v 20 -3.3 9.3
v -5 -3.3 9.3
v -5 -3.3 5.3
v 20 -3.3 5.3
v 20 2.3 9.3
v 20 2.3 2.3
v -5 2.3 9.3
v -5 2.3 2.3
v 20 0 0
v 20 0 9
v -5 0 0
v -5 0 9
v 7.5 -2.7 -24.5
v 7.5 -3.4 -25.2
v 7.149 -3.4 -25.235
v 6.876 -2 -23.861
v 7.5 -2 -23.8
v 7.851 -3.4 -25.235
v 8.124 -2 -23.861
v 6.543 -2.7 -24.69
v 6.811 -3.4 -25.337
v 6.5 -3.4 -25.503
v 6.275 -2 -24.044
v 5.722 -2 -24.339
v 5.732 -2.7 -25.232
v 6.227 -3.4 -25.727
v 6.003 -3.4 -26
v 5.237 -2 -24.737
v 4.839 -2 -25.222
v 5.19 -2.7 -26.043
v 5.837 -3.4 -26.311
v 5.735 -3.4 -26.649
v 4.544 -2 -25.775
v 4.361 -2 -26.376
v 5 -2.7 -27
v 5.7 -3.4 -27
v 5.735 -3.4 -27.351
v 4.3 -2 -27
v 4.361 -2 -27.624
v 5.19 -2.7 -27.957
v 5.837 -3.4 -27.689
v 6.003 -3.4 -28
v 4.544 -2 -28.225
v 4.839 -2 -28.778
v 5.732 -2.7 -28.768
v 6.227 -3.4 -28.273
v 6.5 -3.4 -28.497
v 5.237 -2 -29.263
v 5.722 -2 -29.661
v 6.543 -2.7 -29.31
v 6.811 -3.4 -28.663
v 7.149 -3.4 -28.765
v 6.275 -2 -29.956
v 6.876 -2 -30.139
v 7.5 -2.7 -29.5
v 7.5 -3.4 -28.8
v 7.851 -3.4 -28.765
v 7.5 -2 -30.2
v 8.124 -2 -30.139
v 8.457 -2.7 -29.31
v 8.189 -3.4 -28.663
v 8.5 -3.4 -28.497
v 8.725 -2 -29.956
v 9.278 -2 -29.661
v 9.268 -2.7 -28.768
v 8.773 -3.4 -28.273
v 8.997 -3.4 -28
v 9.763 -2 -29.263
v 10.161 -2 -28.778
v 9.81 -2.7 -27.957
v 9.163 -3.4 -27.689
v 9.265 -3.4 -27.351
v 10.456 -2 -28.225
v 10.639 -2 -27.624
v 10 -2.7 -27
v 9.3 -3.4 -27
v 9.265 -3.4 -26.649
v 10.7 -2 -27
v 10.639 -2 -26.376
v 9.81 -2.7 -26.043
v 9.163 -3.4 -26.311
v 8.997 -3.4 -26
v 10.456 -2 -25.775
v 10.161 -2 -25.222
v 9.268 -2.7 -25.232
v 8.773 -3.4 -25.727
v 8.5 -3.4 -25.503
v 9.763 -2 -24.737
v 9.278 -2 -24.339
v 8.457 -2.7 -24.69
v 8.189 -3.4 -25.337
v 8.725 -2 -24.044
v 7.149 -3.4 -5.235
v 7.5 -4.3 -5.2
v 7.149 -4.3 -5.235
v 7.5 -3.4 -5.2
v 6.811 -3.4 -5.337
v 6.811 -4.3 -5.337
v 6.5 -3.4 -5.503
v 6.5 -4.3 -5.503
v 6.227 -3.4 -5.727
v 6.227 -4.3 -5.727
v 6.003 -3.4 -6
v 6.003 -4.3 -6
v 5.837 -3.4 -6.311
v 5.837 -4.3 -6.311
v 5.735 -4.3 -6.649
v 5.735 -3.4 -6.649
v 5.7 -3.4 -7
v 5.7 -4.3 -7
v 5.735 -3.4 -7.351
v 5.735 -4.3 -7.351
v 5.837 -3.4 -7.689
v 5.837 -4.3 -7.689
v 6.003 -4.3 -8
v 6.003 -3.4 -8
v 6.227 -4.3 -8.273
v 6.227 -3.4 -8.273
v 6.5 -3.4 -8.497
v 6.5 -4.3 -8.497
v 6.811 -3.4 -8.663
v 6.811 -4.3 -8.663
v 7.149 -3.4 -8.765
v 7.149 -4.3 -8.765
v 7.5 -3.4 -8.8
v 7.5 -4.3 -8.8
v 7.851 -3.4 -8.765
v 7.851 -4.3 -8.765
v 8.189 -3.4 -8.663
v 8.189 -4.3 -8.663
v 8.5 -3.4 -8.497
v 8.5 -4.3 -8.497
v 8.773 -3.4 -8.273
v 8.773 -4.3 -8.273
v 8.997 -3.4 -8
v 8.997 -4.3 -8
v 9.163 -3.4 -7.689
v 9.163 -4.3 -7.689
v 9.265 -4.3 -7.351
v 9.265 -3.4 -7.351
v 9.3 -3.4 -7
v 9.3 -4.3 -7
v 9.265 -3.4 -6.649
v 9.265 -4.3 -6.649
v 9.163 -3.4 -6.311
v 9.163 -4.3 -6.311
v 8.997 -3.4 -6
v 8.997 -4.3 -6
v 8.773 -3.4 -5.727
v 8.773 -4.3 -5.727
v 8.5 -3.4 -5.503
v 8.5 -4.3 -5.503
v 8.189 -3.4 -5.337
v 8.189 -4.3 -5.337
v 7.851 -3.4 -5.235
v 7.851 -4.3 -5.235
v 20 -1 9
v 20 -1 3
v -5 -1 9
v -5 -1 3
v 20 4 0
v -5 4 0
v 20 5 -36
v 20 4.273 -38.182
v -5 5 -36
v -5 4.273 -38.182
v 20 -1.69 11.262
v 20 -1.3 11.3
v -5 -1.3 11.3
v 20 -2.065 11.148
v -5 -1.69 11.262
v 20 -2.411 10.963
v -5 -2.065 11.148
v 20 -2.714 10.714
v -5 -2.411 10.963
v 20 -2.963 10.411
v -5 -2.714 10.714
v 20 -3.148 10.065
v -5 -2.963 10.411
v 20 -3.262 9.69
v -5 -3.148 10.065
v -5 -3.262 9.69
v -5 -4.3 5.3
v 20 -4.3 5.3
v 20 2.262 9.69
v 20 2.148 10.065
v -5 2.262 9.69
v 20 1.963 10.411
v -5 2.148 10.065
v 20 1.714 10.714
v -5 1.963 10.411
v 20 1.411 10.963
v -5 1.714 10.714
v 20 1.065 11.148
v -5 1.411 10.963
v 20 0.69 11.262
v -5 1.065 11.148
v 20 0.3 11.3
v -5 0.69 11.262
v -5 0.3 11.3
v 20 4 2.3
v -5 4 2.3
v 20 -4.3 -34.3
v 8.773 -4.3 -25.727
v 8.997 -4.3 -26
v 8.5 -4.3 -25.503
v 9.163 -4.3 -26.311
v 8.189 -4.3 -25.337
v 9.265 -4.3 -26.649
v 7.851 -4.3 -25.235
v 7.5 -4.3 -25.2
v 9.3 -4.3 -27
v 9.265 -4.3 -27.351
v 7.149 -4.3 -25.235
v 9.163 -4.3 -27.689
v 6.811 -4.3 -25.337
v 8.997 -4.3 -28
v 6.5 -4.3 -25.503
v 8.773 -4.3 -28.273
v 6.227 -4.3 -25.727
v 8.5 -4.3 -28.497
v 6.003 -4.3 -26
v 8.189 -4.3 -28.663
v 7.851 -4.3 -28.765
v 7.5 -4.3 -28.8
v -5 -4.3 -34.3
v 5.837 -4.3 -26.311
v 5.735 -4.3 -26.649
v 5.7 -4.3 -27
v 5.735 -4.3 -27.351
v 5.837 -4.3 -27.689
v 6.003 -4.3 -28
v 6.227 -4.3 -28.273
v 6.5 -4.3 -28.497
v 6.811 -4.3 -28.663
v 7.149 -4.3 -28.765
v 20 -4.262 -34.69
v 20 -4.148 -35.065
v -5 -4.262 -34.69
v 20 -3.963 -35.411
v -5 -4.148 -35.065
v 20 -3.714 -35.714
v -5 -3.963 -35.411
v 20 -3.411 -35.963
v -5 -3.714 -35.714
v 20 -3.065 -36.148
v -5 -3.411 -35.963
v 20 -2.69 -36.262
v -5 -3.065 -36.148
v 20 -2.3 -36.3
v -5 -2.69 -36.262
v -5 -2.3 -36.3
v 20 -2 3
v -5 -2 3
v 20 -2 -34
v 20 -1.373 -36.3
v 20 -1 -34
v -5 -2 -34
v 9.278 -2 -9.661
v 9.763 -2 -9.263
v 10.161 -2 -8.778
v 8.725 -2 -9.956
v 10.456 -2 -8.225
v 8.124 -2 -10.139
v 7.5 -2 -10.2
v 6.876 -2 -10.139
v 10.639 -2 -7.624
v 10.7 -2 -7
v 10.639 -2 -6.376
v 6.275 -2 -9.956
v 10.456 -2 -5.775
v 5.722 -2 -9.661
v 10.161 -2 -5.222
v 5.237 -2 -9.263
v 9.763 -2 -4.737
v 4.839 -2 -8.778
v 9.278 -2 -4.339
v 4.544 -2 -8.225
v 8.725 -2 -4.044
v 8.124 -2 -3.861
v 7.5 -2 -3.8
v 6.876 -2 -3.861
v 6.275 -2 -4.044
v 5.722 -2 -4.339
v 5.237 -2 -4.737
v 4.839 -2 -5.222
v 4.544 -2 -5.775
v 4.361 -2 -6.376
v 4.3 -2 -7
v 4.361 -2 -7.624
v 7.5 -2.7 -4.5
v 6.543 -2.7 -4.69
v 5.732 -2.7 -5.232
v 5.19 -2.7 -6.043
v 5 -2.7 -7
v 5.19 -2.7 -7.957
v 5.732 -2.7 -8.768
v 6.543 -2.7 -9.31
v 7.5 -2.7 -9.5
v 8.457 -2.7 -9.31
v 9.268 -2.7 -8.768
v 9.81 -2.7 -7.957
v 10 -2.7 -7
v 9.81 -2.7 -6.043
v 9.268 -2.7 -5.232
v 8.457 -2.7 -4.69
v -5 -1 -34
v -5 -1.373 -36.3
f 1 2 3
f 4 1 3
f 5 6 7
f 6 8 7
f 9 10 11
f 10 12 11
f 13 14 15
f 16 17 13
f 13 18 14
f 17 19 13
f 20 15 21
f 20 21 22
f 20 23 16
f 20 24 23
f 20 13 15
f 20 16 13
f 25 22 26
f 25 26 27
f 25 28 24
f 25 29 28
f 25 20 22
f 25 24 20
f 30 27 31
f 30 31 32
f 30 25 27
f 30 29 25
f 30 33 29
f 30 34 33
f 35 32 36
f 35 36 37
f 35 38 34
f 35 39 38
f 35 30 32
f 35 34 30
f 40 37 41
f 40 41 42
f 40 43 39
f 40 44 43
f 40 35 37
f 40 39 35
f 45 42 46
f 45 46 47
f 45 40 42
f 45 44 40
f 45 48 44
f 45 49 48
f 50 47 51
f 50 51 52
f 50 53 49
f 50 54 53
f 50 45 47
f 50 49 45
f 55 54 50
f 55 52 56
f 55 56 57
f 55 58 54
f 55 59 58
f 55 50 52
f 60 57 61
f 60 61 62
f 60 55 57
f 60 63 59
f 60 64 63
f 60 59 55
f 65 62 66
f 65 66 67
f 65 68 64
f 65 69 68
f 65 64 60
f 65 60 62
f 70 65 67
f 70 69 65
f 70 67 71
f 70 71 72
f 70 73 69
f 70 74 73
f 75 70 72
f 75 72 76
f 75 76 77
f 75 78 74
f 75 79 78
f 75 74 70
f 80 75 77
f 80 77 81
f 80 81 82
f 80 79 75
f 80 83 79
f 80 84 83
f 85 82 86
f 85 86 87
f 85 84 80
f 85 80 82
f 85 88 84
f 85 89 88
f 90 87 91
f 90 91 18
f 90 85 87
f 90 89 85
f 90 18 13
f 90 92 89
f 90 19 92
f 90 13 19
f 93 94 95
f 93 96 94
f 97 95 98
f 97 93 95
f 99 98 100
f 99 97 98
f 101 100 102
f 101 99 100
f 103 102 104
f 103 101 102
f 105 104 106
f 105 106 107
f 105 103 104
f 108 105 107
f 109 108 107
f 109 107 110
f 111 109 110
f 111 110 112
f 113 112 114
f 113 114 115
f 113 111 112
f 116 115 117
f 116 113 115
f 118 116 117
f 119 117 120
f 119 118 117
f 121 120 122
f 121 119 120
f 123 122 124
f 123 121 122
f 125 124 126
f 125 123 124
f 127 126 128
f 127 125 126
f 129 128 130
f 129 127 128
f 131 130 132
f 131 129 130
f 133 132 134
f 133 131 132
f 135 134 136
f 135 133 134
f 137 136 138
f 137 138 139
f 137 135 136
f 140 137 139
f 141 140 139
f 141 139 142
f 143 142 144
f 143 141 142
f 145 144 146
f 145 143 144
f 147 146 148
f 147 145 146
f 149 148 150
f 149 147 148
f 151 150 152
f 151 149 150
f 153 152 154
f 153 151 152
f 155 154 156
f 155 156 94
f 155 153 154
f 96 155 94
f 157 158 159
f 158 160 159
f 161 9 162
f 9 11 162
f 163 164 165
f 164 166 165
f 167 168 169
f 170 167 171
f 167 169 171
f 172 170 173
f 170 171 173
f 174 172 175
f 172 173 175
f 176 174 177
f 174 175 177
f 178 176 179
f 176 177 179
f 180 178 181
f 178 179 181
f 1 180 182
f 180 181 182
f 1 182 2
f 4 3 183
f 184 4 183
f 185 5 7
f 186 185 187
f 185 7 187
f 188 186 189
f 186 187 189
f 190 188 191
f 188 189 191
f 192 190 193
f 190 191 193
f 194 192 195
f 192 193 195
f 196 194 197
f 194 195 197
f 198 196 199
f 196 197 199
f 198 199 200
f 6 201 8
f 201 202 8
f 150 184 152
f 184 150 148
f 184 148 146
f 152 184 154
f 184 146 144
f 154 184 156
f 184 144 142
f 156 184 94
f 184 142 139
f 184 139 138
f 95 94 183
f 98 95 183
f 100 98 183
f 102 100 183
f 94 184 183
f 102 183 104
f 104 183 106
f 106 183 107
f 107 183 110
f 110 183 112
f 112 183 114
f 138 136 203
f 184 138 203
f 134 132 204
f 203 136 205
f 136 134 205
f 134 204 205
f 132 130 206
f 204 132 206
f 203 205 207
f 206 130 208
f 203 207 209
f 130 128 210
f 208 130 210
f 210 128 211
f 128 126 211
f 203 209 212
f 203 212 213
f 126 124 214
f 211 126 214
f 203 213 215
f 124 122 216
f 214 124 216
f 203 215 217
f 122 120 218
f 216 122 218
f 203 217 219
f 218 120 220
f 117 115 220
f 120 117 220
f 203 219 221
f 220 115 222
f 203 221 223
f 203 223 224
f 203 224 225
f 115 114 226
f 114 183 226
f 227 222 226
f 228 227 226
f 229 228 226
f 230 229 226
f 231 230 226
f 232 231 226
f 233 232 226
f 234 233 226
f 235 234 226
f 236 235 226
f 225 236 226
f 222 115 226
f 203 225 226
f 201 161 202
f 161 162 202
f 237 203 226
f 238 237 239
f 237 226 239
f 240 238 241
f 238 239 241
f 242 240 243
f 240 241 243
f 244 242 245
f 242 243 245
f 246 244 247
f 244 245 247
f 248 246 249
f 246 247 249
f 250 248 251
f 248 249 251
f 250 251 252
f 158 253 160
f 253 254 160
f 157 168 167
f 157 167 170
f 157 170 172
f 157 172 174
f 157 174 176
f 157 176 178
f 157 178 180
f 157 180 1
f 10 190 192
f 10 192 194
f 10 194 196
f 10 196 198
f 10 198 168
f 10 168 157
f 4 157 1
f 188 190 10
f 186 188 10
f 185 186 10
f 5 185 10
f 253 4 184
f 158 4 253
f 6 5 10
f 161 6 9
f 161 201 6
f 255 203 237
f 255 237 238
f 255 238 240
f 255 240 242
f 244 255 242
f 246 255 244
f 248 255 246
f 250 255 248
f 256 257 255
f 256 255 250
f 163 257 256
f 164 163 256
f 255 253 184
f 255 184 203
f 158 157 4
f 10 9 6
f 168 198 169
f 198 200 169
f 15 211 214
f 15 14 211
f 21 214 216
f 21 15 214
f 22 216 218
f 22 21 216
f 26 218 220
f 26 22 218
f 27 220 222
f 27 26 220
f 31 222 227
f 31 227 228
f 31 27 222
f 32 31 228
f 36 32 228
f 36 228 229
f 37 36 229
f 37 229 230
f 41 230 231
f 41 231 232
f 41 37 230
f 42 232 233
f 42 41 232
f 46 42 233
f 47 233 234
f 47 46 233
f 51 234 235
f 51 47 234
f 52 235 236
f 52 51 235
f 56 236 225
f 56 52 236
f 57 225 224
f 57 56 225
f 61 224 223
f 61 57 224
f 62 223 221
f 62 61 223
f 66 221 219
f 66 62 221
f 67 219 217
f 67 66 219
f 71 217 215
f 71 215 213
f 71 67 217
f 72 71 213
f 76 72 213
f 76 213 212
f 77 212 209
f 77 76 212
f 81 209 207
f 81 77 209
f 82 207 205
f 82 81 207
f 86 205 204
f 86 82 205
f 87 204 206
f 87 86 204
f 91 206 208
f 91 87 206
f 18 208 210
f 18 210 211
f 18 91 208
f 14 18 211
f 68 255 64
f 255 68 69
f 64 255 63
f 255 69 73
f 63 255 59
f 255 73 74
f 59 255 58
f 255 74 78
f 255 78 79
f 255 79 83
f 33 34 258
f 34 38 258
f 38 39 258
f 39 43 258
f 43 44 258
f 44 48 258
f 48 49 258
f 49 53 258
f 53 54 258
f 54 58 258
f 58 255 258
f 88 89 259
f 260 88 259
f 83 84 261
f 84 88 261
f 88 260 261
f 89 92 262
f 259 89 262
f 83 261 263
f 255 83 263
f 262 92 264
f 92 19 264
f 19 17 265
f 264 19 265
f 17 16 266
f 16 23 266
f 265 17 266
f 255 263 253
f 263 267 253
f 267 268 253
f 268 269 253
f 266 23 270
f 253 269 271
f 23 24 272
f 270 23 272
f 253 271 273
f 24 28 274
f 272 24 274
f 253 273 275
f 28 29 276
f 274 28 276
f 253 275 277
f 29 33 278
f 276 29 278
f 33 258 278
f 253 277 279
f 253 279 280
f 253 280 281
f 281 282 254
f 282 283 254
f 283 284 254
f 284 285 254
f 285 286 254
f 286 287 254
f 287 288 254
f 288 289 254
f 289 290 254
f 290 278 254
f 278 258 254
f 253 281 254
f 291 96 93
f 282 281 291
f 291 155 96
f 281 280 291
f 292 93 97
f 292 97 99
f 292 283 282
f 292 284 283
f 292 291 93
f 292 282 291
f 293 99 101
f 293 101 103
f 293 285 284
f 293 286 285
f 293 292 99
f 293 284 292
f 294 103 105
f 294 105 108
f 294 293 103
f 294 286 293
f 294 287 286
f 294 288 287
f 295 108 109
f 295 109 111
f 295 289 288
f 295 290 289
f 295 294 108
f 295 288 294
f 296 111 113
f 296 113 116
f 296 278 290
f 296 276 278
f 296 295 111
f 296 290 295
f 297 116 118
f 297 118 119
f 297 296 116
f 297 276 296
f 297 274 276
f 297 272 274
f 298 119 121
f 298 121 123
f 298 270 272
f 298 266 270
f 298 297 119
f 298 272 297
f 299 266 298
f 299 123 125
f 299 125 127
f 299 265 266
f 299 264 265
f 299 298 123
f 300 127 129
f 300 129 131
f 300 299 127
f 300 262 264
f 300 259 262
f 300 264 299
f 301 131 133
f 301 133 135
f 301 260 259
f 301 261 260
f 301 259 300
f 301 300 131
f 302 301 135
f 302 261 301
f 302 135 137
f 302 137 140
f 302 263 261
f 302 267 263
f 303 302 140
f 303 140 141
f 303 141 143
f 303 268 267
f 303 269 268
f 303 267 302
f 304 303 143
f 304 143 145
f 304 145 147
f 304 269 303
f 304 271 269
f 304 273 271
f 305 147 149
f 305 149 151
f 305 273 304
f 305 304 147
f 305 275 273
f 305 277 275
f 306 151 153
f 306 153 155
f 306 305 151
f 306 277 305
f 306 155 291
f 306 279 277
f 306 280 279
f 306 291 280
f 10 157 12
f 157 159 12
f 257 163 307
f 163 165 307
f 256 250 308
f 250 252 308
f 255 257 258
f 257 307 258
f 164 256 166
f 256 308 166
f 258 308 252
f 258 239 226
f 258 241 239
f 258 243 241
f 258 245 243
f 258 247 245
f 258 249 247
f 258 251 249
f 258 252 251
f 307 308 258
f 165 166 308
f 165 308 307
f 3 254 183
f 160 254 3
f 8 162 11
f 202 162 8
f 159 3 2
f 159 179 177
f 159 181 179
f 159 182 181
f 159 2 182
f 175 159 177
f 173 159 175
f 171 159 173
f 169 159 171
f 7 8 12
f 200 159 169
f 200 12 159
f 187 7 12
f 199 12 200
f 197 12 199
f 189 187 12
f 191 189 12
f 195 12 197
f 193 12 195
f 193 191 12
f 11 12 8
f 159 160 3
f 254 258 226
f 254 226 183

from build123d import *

# Parameters (mm, degrees)
EXTRUDE_1_DEPTH          = 5
FILLET_1_R               = 2
EXTRUDE_3_DEPTH          = 15
HOLE_WIZARD_1_AT_2_COUNT = 2
HOLE_WIZARD_1_AT_2_PITCH = 20


with BuildPart() as part:
    # 草图1 → 凸台-拉伸1 (new, symmetric)
    with BuildSketch(Plane(origin=(0, 0, 0), x_dir=(0, 0, -1), z_dir=(1, 0, 0))):
        Polygon((0, 4), (0, 0), (-9, 0), (-9, -1), (-3, -1), (-3, -2), (34, -2), (34, -1), (36, 5), (38.181971586, 4.272676138), (36.3, -1.373238618), (36.3, -4.3), (-5.3, -4.3), (-5.3, -3.3), (-11.3, -3.3), (-11.3, 2.3), (-2.3, 2.3), (-2.3, 4), align=None)
    extrude(amount=EXTRUDE_1_DEPTH, both=True)

    # 圆角1
    fillet_1_edges = [part.edges().sort_by_distance(p)[0] for p in [
        (0, -4.3, -36.3),
        (0, -3.3, 11.3),
        (0, 2.3, 11.3),
    ]]
    fillet(fillet_1_edges, radius=FILLET_1_R)

    # 草图7 → 凸台-拉伸3 (add)
    with BuildSketch(Plane(origin=(5, 0, 0), x_dir=(0, 0, -1), z_dir=(1, 0, 0))):
        with BuildLine():
            Line((-5.3, -4.3), (34.3, -4.3))
            ThreePointArc((34.3, -4.3), (35.714213562, -3.714213562), (36.3, -2.3))
            Line((36.3, -2.3), (36.3, -1.373238618))
            Line((36.3, -1.373238618), (38.181971586, 4.272676138))
            Line((38.181971586, 4.272676138), (36, 5))
            Line((36, 5), (34, -1))
            Line((34, -1), (34, -2))
            Line((34, -2), (-3, -2))
            Line((-3, -2), (-3, -1))
            Line((-3, -1), (-9, -1))
            Line((-9, -1), (-9, 0))
            Line((-9, 0), (0, 0))
            Line((0, 0), (0, 4))
            Line((0, 4), (-2.3, 4))
            Line((-2.3, 4), (-2.3, 2.3))
            Line((-2.3, 2.3), (-9.3, 2.3))
            ThreePointArc((-9.3, 2.3), (-10.714213562, 1.714213562), (-11.3, 0.3))
            Line((-11.3, 0.3), (-11.3, -1.3))
            ThreePointArc((-11.3, -1.3), (-10.714213562, -2.714213562), (-9.3, -3.3))
            Line((-9.3, -3.3), (-5.3, -3.3))
            Line((-5.3, -3.3), (-5.3, -4.3))
        make_face()
    extrude(amount=EXTRUDE_3_DEPTH)

    # 草图3 → 打孔尺寸开槽半沉头螺钉的类型1 (revolve, cut)
    with BuildSketch(Plane(origin=(7.5, -2, -27), x_dir=(0, 0, 1), z_dir=(1, 0, 0))):
        Polygon((0, 0), (0, 2.3), (1.8, 2.3), (1.8, 1.4), (3.2, 0), align=None)
    hole_wizard_1 = revolve(axis=Axis((7.5, 4.35, -27), (0, -1, 0)), mode=Mode.SUBTRACT)

    # 打孔尺寸开槽半沉头螺钉的类型1 at 2: 打孔尺寸开槽半沉头螺钉的类型1 ×2
    with Locations(*[(0, 0, i * HOLE_WIZARD_1_AT_2_PITCH) for i in range(1, HOLE_WIZARD_1_AT_2_COUNT)]):
        add(hole_wizard_1, mode=Mode.SUBTRACT)


solid = part.part
